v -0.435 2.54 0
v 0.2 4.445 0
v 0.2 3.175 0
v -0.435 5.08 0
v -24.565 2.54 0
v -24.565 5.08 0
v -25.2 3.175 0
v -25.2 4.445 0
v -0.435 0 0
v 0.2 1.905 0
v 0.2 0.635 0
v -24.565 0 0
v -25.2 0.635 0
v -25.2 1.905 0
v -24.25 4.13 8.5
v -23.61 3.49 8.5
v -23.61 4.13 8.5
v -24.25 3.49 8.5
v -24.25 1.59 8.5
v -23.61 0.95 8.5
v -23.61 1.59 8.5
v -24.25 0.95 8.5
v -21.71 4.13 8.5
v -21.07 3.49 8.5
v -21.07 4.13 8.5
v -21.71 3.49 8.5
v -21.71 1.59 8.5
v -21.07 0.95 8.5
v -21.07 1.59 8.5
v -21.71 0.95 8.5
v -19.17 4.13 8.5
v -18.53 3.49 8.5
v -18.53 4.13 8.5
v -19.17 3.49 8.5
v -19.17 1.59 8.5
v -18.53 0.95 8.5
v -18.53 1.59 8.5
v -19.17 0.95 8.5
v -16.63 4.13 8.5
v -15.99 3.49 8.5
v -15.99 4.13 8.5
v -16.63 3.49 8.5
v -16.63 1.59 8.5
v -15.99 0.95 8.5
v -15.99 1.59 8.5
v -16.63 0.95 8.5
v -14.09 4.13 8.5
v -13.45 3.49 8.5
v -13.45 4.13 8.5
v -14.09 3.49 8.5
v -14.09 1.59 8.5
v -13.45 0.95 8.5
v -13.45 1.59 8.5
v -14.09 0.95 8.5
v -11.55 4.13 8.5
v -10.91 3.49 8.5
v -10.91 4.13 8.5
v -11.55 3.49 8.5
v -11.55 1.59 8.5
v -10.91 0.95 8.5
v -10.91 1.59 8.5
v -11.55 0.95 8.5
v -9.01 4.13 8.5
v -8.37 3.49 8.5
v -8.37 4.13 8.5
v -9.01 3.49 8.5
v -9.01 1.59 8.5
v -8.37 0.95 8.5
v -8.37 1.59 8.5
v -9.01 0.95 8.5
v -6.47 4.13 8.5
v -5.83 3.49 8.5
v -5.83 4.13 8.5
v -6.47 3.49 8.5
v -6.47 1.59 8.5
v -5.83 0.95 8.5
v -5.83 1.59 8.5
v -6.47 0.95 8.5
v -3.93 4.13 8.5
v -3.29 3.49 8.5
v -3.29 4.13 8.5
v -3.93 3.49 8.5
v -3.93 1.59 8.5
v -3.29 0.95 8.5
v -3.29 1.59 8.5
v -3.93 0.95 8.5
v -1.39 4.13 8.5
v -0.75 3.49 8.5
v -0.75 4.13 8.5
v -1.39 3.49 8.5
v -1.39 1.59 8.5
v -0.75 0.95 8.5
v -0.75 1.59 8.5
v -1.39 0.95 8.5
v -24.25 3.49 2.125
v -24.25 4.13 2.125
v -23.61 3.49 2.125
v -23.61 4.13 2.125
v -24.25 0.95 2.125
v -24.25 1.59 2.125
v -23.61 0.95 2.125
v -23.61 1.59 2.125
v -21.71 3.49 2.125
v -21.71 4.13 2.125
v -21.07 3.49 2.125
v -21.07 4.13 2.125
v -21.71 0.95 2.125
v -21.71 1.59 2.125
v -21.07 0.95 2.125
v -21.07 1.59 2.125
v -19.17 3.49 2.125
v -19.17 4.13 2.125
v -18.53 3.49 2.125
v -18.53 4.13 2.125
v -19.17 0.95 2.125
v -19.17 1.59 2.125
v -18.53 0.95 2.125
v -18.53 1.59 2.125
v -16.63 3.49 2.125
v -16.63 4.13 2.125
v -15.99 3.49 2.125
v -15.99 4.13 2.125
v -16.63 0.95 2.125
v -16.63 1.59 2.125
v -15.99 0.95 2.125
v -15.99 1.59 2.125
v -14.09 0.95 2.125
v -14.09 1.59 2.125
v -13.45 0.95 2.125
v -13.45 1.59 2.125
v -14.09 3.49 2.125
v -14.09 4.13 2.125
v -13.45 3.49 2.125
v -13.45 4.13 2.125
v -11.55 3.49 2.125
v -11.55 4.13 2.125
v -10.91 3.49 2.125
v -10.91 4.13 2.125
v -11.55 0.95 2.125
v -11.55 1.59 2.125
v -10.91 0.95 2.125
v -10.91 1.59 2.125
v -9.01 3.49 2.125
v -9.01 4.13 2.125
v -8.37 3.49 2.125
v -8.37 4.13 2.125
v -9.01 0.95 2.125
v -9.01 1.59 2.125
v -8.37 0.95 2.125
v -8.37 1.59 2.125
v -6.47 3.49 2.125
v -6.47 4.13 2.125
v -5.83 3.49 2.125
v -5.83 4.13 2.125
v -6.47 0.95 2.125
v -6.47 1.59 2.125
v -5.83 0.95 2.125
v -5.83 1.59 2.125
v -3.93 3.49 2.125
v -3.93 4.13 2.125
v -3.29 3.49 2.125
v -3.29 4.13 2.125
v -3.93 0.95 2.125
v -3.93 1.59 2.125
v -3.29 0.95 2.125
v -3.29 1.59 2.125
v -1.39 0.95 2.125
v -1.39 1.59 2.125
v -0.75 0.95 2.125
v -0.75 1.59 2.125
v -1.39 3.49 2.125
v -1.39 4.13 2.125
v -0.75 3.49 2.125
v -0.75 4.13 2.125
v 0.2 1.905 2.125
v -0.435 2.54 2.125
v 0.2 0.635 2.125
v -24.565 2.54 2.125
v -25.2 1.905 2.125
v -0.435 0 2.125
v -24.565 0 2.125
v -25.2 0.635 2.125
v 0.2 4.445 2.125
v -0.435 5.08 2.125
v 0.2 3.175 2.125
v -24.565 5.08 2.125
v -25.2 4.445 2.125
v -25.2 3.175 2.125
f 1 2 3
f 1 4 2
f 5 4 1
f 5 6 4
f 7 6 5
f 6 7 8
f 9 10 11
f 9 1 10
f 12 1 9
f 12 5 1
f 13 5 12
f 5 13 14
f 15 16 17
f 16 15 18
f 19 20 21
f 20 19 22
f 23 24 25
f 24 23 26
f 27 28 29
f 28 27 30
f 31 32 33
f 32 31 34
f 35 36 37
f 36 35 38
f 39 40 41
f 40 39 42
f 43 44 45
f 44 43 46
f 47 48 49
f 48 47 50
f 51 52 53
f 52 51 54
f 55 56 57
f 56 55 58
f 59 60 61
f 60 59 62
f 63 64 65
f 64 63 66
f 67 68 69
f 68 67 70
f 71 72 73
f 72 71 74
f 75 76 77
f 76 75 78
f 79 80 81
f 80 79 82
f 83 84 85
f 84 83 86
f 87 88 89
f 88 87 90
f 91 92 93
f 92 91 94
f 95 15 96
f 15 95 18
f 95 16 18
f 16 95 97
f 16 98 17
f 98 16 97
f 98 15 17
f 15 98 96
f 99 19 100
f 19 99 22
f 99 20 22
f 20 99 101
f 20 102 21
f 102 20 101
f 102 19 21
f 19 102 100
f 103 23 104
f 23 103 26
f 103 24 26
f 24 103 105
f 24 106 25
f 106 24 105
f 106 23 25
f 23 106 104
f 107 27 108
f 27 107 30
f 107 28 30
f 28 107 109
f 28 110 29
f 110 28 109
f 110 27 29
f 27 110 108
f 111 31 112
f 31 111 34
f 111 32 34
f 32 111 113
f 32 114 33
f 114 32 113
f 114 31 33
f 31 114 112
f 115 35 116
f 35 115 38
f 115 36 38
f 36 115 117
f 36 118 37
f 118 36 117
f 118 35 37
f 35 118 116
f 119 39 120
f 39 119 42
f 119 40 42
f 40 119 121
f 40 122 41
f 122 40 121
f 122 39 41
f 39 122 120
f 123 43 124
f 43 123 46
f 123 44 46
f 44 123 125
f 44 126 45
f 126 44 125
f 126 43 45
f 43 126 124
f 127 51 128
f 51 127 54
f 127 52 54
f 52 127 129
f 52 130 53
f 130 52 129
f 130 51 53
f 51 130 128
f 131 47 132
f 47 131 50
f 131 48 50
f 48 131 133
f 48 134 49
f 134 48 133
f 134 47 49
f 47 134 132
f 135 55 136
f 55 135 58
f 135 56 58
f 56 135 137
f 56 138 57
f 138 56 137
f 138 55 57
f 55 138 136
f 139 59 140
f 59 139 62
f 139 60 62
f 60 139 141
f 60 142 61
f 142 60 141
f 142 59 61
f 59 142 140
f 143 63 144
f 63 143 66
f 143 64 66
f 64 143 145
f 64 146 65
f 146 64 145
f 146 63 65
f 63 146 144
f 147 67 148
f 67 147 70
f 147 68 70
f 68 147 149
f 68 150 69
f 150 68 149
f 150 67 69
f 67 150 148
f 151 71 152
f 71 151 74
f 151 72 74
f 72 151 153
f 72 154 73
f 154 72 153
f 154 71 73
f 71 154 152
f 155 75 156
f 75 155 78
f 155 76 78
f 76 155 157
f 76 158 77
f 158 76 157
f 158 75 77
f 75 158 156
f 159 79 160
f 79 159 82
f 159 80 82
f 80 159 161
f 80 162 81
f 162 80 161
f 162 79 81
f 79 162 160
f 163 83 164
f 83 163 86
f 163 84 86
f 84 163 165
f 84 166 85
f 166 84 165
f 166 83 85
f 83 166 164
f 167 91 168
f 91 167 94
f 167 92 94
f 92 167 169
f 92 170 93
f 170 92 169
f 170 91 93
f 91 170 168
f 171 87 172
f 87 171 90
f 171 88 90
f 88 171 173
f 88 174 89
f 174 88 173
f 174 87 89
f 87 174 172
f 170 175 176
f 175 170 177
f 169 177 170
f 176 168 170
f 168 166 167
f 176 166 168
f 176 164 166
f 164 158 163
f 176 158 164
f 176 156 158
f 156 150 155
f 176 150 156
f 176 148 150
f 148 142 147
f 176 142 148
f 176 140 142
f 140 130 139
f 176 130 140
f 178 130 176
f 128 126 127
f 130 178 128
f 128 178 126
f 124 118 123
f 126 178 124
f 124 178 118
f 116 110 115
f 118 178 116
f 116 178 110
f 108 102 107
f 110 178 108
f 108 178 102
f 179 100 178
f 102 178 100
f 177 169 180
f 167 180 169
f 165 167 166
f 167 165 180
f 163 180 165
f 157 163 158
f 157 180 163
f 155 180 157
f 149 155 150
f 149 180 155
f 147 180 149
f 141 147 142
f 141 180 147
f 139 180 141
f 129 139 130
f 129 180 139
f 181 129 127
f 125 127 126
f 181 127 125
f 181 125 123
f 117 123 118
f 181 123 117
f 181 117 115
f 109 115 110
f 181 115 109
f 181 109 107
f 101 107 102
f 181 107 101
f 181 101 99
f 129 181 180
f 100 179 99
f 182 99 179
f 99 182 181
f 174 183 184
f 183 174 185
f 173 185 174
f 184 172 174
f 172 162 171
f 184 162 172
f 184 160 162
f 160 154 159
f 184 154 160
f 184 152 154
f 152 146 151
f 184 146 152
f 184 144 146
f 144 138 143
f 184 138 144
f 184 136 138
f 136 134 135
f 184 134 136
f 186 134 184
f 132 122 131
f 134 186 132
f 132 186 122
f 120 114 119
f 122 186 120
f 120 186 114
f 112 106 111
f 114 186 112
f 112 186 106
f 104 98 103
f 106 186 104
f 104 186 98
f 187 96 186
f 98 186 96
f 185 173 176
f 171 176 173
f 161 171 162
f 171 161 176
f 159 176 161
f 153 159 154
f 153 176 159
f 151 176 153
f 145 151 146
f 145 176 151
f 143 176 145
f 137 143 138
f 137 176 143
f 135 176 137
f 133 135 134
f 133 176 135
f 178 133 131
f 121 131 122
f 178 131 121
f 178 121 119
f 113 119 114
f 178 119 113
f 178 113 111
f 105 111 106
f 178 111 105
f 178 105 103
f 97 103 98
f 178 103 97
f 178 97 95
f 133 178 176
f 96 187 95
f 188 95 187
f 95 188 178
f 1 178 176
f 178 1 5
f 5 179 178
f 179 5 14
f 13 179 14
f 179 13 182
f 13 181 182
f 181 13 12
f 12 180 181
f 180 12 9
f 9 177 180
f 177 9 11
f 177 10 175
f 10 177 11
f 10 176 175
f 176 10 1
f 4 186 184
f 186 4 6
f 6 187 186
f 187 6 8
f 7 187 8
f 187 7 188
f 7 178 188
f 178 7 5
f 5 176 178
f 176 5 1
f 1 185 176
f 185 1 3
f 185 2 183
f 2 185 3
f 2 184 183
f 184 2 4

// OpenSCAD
include <../../lib/device/component.scad>;

rotate([0,0,90]) pin_header_pitch254(2, 10);
